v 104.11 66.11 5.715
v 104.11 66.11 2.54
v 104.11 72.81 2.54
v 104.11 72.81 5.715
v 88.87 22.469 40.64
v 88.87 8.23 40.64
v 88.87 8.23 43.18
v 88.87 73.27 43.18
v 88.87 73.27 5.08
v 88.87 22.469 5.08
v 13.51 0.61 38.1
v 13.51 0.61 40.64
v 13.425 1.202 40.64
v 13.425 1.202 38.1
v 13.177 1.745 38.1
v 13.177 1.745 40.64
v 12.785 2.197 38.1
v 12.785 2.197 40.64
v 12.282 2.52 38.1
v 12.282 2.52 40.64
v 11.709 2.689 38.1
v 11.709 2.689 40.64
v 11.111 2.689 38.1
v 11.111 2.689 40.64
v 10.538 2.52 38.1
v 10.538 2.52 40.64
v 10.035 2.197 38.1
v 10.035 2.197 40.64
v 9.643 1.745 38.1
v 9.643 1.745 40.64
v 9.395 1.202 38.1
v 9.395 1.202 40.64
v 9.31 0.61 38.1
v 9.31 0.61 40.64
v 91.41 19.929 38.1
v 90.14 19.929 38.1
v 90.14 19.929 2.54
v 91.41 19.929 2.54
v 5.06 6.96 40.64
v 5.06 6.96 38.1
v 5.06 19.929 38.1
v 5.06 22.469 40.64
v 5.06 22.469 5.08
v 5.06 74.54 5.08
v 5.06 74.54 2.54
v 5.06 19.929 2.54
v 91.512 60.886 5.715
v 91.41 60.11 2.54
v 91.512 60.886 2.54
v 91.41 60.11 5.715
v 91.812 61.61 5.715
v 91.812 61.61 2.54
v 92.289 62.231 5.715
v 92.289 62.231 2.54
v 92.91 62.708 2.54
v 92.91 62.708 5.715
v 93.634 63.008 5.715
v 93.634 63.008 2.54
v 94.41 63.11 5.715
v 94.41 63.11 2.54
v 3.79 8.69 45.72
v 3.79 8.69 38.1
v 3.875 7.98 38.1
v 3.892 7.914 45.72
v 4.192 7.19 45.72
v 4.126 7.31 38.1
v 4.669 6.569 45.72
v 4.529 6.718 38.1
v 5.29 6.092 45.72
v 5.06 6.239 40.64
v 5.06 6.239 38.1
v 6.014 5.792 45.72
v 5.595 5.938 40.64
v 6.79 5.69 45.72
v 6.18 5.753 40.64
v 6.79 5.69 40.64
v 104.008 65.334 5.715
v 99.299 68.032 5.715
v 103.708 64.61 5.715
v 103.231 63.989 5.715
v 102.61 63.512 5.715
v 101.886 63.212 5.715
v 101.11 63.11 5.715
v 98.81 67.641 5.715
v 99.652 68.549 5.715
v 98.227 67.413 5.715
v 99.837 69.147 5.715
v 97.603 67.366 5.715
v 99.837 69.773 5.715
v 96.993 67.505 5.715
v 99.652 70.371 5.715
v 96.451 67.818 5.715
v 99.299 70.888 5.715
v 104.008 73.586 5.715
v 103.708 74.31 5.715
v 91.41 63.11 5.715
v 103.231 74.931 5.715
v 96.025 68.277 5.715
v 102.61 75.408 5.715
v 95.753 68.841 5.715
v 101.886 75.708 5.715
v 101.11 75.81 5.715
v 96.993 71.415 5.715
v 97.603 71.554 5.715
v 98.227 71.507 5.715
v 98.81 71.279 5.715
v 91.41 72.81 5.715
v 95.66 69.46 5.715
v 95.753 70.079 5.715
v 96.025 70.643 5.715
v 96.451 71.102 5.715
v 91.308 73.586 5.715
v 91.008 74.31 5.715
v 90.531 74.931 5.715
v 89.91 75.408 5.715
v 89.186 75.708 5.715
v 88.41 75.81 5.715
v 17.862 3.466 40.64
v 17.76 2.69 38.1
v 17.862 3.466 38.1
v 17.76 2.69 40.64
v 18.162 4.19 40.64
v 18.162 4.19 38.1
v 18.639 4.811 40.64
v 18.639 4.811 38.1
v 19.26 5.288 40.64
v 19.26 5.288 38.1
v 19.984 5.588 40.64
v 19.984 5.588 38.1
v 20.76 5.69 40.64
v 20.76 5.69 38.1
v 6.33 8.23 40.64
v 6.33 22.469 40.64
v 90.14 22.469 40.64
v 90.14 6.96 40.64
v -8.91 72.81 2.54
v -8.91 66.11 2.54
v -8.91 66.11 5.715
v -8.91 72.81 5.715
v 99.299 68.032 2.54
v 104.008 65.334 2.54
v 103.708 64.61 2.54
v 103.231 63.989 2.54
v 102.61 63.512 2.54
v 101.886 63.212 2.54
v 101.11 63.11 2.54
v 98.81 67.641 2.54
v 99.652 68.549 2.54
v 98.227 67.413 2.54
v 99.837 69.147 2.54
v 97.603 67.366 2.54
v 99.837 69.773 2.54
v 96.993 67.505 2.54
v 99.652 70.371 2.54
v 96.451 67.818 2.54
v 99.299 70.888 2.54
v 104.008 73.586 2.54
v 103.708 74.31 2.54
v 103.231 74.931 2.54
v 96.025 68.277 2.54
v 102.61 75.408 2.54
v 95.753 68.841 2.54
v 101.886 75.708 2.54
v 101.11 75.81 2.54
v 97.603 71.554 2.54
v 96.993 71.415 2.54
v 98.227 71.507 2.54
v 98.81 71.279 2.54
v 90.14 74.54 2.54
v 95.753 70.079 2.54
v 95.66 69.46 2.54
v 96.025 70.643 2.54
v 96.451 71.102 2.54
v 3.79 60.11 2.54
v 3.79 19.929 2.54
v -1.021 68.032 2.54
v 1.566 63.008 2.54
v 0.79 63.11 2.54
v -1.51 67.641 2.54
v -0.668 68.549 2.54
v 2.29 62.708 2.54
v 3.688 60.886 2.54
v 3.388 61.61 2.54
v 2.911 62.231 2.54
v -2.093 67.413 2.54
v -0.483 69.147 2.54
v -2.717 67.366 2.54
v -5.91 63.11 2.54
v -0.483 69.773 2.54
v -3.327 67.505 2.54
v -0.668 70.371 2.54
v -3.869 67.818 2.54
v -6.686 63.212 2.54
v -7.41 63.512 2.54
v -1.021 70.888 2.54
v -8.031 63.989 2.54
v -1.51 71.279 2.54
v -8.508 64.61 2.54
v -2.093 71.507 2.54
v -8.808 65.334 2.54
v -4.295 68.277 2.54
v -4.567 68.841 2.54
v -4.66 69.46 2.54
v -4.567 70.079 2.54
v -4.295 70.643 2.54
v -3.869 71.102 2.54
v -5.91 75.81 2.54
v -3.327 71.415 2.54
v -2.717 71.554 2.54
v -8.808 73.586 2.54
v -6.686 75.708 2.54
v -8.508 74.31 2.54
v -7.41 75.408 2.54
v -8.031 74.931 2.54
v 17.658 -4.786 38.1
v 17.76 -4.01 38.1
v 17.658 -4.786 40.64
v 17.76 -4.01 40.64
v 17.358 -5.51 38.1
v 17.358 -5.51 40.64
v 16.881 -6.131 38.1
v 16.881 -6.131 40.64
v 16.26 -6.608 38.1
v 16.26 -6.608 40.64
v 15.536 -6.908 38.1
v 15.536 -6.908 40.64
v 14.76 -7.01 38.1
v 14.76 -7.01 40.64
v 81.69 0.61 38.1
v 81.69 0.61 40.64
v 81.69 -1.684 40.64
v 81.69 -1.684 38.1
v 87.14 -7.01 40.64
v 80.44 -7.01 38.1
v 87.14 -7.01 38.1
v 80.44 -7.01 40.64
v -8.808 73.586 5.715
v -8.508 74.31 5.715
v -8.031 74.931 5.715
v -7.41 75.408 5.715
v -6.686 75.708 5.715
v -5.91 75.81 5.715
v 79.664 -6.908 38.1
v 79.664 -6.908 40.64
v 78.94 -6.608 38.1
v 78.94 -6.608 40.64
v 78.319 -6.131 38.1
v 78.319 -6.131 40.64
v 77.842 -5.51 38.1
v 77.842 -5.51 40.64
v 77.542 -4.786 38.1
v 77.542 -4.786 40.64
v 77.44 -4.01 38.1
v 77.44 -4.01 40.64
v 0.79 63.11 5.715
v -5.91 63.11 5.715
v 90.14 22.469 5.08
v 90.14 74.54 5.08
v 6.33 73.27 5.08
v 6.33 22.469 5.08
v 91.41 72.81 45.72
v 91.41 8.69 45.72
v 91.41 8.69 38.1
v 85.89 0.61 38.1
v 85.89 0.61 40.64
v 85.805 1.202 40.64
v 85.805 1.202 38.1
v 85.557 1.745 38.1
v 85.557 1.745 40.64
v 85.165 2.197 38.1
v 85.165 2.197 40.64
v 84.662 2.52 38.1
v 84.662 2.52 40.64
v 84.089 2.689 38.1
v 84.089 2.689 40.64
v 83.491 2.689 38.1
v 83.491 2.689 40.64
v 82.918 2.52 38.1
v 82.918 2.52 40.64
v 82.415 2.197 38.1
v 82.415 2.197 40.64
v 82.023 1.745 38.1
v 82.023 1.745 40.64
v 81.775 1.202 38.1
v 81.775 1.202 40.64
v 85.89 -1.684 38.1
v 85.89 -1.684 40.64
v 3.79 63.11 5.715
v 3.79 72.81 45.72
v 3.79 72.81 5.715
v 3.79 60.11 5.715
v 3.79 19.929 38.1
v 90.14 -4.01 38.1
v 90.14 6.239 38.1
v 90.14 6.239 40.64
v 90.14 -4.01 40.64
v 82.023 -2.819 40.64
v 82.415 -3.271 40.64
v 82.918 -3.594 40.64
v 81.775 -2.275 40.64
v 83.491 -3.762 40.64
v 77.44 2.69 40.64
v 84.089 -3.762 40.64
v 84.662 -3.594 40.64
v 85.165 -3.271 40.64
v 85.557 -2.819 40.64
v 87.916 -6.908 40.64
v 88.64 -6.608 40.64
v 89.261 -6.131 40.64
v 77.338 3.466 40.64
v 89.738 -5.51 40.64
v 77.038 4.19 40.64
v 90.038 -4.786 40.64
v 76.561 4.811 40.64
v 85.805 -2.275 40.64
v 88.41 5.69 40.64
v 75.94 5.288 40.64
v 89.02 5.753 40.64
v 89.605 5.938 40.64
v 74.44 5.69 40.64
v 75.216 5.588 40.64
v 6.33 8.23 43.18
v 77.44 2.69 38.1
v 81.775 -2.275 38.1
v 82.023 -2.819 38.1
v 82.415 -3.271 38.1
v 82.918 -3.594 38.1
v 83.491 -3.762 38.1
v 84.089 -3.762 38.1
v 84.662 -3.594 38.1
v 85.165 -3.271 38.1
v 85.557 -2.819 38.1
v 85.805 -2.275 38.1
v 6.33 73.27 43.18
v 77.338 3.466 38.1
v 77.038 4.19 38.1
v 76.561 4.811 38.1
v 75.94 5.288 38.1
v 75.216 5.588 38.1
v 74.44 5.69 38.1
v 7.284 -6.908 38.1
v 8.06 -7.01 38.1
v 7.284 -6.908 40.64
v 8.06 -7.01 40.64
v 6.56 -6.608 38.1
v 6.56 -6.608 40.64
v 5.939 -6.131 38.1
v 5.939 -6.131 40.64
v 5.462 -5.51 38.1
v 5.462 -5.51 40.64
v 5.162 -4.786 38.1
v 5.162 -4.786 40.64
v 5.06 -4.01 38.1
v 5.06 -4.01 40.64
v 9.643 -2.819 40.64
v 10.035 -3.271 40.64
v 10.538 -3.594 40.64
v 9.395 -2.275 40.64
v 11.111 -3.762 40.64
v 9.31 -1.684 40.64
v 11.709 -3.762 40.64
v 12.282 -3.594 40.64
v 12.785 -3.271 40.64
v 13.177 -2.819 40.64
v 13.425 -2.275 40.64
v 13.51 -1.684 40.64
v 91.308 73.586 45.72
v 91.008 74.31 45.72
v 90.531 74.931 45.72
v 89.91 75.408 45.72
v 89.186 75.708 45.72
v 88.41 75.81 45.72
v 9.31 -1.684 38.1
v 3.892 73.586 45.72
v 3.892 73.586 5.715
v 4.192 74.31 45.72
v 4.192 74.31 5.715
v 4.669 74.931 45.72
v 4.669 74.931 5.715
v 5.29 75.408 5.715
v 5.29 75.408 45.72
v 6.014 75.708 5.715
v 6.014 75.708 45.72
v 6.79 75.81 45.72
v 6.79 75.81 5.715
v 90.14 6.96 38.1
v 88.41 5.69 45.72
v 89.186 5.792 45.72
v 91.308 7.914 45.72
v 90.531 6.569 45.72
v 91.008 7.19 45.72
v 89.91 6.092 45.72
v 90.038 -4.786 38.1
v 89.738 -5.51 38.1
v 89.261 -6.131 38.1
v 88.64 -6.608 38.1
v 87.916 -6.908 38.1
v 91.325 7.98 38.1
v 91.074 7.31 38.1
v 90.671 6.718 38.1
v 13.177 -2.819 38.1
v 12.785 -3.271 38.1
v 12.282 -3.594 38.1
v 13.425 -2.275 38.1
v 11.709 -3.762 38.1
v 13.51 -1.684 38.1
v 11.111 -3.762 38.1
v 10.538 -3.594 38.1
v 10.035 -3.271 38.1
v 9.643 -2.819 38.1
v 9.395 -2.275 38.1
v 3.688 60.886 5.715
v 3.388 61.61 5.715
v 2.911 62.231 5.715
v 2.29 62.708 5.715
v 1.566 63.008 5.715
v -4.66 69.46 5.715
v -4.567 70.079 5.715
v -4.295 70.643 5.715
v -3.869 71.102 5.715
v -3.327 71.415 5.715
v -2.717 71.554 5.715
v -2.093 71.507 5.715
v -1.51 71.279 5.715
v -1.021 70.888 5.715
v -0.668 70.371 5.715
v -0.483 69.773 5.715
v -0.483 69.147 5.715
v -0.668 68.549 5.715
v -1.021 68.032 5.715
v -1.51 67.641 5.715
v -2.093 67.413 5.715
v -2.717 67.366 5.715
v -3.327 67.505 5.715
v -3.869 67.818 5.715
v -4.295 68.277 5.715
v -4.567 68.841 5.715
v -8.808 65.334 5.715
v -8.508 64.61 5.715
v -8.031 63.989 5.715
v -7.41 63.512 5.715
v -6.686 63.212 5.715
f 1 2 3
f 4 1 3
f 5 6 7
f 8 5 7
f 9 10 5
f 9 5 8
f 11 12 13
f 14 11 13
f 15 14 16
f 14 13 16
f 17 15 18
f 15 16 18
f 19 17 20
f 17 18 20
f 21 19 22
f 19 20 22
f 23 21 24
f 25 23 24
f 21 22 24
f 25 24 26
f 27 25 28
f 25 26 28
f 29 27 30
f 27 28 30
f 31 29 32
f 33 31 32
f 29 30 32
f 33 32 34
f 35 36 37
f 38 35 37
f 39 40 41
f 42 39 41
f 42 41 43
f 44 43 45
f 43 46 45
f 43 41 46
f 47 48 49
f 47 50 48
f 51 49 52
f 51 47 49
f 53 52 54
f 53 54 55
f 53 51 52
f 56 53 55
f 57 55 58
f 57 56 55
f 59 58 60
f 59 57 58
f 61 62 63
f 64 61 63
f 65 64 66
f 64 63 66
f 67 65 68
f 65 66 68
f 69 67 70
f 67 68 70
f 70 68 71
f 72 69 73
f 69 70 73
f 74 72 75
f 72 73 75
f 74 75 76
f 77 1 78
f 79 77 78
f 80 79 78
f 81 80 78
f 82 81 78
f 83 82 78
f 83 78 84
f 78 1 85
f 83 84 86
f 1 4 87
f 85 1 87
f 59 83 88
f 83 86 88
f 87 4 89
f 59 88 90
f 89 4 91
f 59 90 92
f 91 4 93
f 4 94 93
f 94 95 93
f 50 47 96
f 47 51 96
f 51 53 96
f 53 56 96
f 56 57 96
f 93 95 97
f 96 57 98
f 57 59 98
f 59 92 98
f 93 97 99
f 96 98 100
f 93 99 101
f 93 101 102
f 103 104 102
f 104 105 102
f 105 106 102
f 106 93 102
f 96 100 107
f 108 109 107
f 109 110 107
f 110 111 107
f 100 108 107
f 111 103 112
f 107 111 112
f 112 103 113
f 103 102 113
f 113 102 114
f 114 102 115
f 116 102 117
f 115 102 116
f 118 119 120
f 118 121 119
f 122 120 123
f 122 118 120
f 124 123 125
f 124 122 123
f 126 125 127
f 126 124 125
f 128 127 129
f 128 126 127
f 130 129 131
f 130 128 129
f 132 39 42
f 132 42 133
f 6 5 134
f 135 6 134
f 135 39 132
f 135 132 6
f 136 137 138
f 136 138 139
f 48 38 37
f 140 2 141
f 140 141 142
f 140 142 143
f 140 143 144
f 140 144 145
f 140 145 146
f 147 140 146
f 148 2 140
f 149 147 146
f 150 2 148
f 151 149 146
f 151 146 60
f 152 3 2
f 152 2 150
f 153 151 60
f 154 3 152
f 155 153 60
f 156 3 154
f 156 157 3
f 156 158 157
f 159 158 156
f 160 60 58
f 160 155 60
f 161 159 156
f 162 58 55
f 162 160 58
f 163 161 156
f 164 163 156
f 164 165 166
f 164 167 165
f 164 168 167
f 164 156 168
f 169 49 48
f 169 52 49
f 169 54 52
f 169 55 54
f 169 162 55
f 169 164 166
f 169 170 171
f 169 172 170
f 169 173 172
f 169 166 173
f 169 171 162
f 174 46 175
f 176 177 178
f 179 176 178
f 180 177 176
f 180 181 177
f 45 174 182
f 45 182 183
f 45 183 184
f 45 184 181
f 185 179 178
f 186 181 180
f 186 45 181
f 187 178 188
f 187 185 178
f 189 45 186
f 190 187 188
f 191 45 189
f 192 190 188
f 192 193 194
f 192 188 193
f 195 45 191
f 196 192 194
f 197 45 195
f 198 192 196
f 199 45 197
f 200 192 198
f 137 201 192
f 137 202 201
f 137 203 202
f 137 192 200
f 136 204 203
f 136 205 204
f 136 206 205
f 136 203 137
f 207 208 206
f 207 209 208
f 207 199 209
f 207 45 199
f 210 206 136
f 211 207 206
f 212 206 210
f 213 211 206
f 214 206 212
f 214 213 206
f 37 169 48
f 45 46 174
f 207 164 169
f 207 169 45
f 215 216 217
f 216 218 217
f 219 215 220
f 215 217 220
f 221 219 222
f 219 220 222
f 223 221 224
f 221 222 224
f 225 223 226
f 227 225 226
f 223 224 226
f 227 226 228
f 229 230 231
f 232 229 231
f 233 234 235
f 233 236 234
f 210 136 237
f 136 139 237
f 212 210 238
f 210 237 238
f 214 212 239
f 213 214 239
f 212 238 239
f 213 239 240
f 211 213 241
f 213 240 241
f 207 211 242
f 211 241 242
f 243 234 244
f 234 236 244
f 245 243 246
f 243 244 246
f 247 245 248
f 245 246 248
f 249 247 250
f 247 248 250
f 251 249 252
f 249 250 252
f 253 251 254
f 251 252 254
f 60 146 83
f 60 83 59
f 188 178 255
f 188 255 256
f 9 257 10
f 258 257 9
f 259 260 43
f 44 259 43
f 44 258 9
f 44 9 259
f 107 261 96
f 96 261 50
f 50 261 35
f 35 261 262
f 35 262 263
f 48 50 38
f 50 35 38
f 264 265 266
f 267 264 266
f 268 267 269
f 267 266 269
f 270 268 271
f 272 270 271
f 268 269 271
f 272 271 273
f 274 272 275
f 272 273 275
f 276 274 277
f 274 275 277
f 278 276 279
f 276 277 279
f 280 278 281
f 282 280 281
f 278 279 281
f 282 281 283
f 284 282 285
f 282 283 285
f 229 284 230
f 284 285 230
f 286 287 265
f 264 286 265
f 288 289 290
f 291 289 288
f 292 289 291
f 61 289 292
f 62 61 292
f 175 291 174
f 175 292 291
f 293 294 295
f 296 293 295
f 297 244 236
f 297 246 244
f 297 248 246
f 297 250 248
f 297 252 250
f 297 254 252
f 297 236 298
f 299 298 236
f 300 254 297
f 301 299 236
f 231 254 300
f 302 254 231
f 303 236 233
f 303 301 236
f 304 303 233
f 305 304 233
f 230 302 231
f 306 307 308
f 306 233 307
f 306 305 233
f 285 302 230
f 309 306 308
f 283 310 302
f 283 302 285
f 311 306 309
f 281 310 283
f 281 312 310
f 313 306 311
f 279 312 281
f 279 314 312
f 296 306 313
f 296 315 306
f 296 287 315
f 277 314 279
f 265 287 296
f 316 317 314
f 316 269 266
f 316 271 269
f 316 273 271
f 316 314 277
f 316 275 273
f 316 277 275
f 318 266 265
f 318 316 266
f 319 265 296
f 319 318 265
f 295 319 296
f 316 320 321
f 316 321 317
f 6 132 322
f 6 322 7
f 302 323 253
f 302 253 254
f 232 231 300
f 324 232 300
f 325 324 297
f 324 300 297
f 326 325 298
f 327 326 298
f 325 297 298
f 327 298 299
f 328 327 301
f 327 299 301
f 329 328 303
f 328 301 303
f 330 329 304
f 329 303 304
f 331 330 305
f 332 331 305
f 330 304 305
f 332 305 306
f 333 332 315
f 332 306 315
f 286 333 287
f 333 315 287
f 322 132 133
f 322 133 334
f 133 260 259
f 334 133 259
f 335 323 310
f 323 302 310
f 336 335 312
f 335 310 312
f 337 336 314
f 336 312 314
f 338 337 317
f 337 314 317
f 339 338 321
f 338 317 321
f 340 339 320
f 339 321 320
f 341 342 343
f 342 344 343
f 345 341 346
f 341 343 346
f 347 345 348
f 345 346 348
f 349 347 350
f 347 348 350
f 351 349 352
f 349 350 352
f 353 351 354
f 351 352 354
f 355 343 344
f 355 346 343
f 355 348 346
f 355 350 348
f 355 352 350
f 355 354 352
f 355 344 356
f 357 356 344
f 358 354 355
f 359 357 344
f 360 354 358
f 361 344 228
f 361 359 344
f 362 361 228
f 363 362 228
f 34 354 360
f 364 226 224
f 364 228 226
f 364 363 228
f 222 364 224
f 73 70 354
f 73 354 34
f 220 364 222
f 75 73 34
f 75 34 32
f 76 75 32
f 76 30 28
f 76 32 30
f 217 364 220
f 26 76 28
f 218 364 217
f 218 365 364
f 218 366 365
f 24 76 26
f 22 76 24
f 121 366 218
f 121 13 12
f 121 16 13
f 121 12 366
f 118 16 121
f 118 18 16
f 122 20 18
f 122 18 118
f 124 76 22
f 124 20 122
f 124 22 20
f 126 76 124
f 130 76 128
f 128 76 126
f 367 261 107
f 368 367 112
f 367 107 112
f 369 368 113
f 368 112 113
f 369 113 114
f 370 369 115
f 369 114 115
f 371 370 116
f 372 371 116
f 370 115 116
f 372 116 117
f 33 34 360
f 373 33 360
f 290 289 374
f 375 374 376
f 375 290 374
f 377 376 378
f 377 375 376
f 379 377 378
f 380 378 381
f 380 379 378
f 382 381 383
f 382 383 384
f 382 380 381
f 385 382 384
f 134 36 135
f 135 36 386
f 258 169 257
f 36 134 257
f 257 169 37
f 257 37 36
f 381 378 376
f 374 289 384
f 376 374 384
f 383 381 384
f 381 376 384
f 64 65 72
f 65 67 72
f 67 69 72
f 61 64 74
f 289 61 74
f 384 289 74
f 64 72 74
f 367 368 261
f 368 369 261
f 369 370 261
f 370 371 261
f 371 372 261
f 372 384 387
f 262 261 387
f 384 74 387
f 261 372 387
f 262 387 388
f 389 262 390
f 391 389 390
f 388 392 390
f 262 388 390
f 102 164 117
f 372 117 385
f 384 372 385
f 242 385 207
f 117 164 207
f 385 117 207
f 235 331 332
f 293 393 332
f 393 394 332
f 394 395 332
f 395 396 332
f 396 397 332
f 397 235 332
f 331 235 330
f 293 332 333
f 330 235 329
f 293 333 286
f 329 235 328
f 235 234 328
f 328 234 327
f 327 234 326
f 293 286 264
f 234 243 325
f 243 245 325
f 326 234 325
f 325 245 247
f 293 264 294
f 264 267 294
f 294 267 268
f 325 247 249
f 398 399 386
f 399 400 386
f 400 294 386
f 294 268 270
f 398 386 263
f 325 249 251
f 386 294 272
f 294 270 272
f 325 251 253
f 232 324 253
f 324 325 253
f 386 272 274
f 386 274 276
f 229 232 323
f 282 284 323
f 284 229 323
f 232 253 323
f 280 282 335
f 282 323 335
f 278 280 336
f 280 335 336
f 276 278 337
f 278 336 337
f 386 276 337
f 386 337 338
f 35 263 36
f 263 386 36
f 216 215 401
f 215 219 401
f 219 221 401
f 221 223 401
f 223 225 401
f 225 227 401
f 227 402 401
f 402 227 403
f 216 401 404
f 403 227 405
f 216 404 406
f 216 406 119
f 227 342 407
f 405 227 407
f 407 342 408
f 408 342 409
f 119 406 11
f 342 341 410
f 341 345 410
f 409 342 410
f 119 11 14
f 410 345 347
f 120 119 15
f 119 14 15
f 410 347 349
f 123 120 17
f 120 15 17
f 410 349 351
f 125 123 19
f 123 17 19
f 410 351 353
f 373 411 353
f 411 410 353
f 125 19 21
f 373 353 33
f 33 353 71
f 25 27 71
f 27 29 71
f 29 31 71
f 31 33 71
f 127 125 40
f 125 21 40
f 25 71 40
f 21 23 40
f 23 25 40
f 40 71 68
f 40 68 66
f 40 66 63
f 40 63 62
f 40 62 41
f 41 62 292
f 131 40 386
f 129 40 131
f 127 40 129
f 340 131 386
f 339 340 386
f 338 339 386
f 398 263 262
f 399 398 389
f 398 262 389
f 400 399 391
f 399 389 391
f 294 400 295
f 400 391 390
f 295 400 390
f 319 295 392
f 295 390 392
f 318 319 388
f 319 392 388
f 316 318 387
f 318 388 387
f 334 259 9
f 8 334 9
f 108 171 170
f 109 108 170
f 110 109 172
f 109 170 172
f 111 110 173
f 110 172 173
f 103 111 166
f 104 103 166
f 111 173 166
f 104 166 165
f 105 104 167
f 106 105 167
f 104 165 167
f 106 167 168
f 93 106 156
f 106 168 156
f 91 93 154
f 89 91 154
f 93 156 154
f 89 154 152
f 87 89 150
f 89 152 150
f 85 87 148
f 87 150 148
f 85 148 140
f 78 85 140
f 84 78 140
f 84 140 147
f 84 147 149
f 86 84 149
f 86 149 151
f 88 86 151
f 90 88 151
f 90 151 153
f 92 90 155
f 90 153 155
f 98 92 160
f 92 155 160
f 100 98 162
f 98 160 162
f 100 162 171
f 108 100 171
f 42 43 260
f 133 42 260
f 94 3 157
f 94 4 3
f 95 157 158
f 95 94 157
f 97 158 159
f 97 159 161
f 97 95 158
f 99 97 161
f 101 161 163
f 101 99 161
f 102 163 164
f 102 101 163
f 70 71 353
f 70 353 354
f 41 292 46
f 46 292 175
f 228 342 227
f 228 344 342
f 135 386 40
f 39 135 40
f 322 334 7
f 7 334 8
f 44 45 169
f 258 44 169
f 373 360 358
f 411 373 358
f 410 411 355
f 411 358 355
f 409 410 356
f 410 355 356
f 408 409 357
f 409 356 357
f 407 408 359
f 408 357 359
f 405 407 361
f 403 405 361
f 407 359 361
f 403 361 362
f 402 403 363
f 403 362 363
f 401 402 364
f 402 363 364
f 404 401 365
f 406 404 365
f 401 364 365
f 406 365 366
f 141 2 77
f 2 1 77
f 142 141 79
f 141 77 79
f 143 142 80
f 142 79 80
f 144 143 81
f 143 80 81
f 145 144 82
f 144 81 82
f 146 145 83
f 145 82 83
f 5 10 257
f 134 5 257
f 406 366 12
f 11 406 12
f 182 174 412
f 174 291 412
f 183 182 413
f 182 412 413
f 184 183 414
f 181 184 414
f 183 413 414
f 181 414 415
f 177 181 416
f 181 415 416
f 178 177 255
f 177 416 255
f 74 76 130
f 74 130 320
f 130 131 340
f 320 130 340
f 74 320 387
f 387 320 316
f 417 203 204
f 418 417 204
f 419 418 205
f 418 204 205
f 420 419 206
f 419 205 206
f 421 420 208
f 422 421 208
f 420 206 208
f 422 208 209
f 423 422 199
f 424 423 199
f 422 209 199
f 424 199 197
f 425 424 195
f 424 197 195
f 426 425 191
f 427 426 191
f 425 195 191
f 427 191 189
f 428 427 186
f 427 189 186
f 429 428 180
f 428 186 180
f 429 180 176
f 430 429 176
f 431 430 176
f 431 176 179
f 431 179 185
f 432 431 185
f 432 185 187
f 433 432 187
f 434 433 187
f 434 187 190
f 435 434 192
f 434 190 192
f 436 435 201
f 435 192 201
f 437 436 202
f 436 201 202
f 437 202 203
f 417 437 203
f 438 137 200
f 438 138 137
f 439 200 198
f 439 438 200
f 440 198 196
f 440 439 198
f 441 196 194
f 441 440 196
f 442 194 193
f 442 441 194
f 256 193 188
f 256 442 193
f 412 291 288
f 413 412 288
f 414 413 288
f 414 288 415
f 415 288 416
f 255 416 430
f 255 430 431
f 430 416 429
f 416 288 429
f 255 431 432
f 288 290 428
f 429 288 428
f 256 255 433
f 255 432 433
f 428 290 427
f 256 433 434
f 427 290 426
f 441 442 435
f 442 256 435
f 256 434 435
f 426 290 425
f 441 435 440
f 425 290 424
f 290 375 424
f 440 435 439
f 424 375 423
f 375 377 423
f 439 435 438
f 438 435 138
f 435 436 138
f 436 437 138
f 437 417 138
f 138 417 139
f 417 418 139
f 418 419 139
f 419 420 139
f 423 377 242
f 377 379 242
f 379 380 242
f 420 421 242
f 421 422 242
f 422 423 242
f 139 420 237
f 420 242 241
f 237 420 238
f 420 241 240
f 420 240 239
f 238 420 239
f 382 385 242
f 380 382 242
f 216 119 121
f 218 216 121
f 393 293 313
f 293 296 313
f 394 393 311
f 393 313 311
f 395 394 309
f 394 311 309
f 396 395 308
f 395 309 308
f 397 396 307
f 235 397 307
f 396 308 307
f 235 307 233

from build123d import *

# Parameters (mm, degrees)
SKETCH1_W           = 82.539998569
SKETCH1_H           = 65.04
BOSS_EXTRUDE1_DEPTH = 43.18
SHELL1_T            = 2.54
CUT_EXTRUDE2_DEPTH  = 124.028758627
SKETCH7_W           = 87.619998569
SKETCH7_H           = 43.18
BOSS_EXTRUDE2_DEPTH = 2.54
CUT_EXTRUDE3_DEPTH  = 2.54
CUT_EXTRUDE4_DEPTH  = 2.54
SKETCH10_W          = 1.27
SKETCH10_H          = 35.56
CUT_EXTRUDE5_DEPTH  = 2.54
SKETCH11_W          = 12.7
SKETCH11_H          = 2.54
BOSS_EXTRUDE3_DEPTH = 12.7
CUT_EXTRUDE7_DEPTH  = 125.717897357
SKETCH13_W          = 12.7
SKETCH13_H          = 12.7
SKETCH13_R          = 2.1
BOSS_EXTRUDE4_DEPTH = 3.175
FILLET2_R           = 3


with BuildPart() as part:
    # Sketch1 → Boss-Extrude1 (new body)
    with BuildSketch(Plane.XY):
        with Locations((47.599999189, 40.75)):
            Rectangle(SKETCH1_W, SKETCH1_H)
    extrude(amount=BOSS_EXTRUDE1_DEPTH)

    # Shell1
    shell1_openings = [part.faces().sort_by_distance(p)[0] for p in [
        (47.599999189, 73.27, 21.59),
        (47.599999189, 40.75, 0),
    ]]
    offset(amount=SHELL1_T, openings=shell1_openings, kind=Kind.INTERSECTION)

    # Sketch6 → Cut-Extrude2 (cut, through all)
    with BuildSketch(Plane.ZY.offset(-3.789999905)):
        Polygon((2.54, 59.03), (2.54, 73.27), (0, 73.27), (0, 59.03), (0, 3.15), (38.1, 3.15), (38.1, 19.92924), (2.54, 19.92924), align=None)
    extrude(amount=-CUT_EXTRUDE2_DEPTH, mode=Mode.SUBTRACT)

    # Sketch7 → Boss-Extrude2 (add)
    with BuildSketch(Plane(origin=(0, 73.27, 0), x_dir=(1, 0, 0), z_dir=(0, 1, 0))):
        with Locations((47.59999919, -24.13)):
            Rectangle(SKETCH7_W, SKETCH7_H)
    extrude(amount=BOSS_EXTRUDE2_DEPTH)

    # Sketch8 → Cut-Extrude3 (cut)
    with BuildSketch(Plane(origin=(0, 0, 2.54), x_dir=(-1, 0, 0), z_dir=(0, 0, -1))):
        Polygon((-65.405564728, 73.27), (-65.405564728, 74.54), (-90.139998474, 74.54), (-90.139998474, 19.92924), (-88.869998474, 19.92924), (-88.869998474, 73.27), align=None)
        Polygon((-5.059999905, 74.54), (-65.405564728, 74.54), (-65.405564728, 73.27), (-6.329999905, 73.27), (-6.329999905, 19.92924), (-5.059999905, 19.92924), align=None)
    extrude(amount=-CUT_EXTRUDE3_DEPTH, mode=Mode.SUBTRACT)

    # Sketch9 → Cut-Extrude4 (cut)
    with BuildSketch(Plane(origin=(0, 0, 38.1), x_dir=(-1, 0, 0), z_dir=(0, 0, -1))):
        Polygon((-90.139998474, 19.92924), (-90.139998474, 6.96), (-5.059999905, 6.96), (-5.059999905, 19.92924), (-6.329999905, 19.92924), (-6.329999905, 8.23), (-88.869998474, 8.23), (-88.869998474, 19.92924), align=None)
    extrude(amount=-CUT_EXTRUDE4_DEPTH, mode=Mode.SUBTRACT)

    # Sketch10 → Cut-Extrude5 (cut)
    with BuildSketch(Plane.XZ.offset(-19.92924)):
        with Locations((5.694999905, 22.86)):
            Rectangle(SKETCH10_W, SKETCH10_H)
        with Locations((89.504998474, 22.86)):
            Rectangle(SKETCH10_W, SKETCH10_H)
    extrude(amount=-CUT_EXTRUDE5_DEPTH, mode=Mode.SUBTRACT)

    # Sketch11 → Boss-Extrude3 (add)
    with BuildSketch(Plane.XZ.offset(-5.69)):
        with Locations((11.409999905, 39.37)):
            Rectangle(SKETCH11_W, SKETCH11_H)
        with Locations((83.789998474, 39.37)):
            Rectangle(SKETCH11_W, SKETCH11_H)
    extrude(amount=BOSS_EXTRUDE3_DEPTH)

    # Sketch12 → Cut-Extrude7 (cut, through all)
    with BuildSketch(Plane.XY.offset(40.64)):
        with BuildLine():
            Line((9.309999905, 0.61), (9.309999905, -1.683510845))
            ThreePointArc((9.309999905, -1.683510845), (11.409999905, -3.783510845), (13.509999905, -1.683510845))
            Line((13.509999905, -1.683510845), (13.509999905, 0.61))
            ThreePointArc((13.509999905, 0.61), (11.409999905, 2.71), (9.309999905, 0.61))
        make_face()
        with BuildLine():
            Line((81.689998474, 0.61), (81.689998474, -1.683510845))
            ThreePointArc((81.689998474, -1.683510845), (83.789998474, -3.783510845), (85.889998474, -1.683510845))
            Line((85.889998474, -1.683510845), (85.889998474, 0.61))
            ThreePointArc((85.889998474, 0.61), (83.789998474, 2.71), (81.689998474, 0.61))
        make_face()
    extrude(amount=-CUT_EXTRUDE7_DEPTH, mode=Mode.SUBTRACT)

    # Sketch13 → Boss-Extrude4 (add)
    # profile 1 of 2: a face of its own
    with BuildSketch(Plane(origin=(0, 0, 2.54), x_dir=(-1, 0, 0), z_dir=(0, 0, -1))):
        with Locations((-97.759998474, 69.46)):
            Rectangle(SKETCH13_W, SKETCH13_H)
        with Locations((-97.759998474, 69.46)):
            Circle(SKETCH13_R, mode=Mode.SUBTRACT)
    # profile 2 of 2: a face of its own
    with BuildSketch(Plane(origin=(0, 0, 2.54), x_dir=(-1, 0, 0), z_dir=(0, 0, -1))):
        with Locations((2.560000095, 69.46)):
            Rectangle(SKETCH13_W, SKETCH13_H)
        with Locations((2.560000095, 69.46)):
            Circle(SKETCH13_R, mode=Mode.SUBTRACT)
    extrude(amount=-BOSS_EXTRUDE4_DEPTH)

    # Fillet2
    fillet2_edges = [part.edges().sort_by_distance(p)[0] for p in [
        (17.759999905, 5.69, 39.37),
        (5.059999905, -7.01, 39.37),
        (17.759999905, -7.01, 39.37),
        (77.439998474, 5.69, 39.37),
        (90.139998474, -7.01, 39.37),
        (77.439998474, -7.01, 39.37),
        (91.409998474, 63.11, 4.1275),
        (104.109998474, 63.11, 4.1275),
        (104.109998474, 75.81, 4.1275),
        (3.789999905, 75.81, 25.7175),
        (3.789999905, 63.11, 4.1275),
        (-8.910000095, 75.81, 4.1275),
        (-8.910000095, 63.11, 4.1275),
        (91.409998474, 75.81, 25.7175),
        (91.409998474, 5.69, 41.91),
        (3.789999905, 5.69, 41.91),
    ]]
    fillet(fillet2_edges, radius=FILLET2_R)


solid = part.part
